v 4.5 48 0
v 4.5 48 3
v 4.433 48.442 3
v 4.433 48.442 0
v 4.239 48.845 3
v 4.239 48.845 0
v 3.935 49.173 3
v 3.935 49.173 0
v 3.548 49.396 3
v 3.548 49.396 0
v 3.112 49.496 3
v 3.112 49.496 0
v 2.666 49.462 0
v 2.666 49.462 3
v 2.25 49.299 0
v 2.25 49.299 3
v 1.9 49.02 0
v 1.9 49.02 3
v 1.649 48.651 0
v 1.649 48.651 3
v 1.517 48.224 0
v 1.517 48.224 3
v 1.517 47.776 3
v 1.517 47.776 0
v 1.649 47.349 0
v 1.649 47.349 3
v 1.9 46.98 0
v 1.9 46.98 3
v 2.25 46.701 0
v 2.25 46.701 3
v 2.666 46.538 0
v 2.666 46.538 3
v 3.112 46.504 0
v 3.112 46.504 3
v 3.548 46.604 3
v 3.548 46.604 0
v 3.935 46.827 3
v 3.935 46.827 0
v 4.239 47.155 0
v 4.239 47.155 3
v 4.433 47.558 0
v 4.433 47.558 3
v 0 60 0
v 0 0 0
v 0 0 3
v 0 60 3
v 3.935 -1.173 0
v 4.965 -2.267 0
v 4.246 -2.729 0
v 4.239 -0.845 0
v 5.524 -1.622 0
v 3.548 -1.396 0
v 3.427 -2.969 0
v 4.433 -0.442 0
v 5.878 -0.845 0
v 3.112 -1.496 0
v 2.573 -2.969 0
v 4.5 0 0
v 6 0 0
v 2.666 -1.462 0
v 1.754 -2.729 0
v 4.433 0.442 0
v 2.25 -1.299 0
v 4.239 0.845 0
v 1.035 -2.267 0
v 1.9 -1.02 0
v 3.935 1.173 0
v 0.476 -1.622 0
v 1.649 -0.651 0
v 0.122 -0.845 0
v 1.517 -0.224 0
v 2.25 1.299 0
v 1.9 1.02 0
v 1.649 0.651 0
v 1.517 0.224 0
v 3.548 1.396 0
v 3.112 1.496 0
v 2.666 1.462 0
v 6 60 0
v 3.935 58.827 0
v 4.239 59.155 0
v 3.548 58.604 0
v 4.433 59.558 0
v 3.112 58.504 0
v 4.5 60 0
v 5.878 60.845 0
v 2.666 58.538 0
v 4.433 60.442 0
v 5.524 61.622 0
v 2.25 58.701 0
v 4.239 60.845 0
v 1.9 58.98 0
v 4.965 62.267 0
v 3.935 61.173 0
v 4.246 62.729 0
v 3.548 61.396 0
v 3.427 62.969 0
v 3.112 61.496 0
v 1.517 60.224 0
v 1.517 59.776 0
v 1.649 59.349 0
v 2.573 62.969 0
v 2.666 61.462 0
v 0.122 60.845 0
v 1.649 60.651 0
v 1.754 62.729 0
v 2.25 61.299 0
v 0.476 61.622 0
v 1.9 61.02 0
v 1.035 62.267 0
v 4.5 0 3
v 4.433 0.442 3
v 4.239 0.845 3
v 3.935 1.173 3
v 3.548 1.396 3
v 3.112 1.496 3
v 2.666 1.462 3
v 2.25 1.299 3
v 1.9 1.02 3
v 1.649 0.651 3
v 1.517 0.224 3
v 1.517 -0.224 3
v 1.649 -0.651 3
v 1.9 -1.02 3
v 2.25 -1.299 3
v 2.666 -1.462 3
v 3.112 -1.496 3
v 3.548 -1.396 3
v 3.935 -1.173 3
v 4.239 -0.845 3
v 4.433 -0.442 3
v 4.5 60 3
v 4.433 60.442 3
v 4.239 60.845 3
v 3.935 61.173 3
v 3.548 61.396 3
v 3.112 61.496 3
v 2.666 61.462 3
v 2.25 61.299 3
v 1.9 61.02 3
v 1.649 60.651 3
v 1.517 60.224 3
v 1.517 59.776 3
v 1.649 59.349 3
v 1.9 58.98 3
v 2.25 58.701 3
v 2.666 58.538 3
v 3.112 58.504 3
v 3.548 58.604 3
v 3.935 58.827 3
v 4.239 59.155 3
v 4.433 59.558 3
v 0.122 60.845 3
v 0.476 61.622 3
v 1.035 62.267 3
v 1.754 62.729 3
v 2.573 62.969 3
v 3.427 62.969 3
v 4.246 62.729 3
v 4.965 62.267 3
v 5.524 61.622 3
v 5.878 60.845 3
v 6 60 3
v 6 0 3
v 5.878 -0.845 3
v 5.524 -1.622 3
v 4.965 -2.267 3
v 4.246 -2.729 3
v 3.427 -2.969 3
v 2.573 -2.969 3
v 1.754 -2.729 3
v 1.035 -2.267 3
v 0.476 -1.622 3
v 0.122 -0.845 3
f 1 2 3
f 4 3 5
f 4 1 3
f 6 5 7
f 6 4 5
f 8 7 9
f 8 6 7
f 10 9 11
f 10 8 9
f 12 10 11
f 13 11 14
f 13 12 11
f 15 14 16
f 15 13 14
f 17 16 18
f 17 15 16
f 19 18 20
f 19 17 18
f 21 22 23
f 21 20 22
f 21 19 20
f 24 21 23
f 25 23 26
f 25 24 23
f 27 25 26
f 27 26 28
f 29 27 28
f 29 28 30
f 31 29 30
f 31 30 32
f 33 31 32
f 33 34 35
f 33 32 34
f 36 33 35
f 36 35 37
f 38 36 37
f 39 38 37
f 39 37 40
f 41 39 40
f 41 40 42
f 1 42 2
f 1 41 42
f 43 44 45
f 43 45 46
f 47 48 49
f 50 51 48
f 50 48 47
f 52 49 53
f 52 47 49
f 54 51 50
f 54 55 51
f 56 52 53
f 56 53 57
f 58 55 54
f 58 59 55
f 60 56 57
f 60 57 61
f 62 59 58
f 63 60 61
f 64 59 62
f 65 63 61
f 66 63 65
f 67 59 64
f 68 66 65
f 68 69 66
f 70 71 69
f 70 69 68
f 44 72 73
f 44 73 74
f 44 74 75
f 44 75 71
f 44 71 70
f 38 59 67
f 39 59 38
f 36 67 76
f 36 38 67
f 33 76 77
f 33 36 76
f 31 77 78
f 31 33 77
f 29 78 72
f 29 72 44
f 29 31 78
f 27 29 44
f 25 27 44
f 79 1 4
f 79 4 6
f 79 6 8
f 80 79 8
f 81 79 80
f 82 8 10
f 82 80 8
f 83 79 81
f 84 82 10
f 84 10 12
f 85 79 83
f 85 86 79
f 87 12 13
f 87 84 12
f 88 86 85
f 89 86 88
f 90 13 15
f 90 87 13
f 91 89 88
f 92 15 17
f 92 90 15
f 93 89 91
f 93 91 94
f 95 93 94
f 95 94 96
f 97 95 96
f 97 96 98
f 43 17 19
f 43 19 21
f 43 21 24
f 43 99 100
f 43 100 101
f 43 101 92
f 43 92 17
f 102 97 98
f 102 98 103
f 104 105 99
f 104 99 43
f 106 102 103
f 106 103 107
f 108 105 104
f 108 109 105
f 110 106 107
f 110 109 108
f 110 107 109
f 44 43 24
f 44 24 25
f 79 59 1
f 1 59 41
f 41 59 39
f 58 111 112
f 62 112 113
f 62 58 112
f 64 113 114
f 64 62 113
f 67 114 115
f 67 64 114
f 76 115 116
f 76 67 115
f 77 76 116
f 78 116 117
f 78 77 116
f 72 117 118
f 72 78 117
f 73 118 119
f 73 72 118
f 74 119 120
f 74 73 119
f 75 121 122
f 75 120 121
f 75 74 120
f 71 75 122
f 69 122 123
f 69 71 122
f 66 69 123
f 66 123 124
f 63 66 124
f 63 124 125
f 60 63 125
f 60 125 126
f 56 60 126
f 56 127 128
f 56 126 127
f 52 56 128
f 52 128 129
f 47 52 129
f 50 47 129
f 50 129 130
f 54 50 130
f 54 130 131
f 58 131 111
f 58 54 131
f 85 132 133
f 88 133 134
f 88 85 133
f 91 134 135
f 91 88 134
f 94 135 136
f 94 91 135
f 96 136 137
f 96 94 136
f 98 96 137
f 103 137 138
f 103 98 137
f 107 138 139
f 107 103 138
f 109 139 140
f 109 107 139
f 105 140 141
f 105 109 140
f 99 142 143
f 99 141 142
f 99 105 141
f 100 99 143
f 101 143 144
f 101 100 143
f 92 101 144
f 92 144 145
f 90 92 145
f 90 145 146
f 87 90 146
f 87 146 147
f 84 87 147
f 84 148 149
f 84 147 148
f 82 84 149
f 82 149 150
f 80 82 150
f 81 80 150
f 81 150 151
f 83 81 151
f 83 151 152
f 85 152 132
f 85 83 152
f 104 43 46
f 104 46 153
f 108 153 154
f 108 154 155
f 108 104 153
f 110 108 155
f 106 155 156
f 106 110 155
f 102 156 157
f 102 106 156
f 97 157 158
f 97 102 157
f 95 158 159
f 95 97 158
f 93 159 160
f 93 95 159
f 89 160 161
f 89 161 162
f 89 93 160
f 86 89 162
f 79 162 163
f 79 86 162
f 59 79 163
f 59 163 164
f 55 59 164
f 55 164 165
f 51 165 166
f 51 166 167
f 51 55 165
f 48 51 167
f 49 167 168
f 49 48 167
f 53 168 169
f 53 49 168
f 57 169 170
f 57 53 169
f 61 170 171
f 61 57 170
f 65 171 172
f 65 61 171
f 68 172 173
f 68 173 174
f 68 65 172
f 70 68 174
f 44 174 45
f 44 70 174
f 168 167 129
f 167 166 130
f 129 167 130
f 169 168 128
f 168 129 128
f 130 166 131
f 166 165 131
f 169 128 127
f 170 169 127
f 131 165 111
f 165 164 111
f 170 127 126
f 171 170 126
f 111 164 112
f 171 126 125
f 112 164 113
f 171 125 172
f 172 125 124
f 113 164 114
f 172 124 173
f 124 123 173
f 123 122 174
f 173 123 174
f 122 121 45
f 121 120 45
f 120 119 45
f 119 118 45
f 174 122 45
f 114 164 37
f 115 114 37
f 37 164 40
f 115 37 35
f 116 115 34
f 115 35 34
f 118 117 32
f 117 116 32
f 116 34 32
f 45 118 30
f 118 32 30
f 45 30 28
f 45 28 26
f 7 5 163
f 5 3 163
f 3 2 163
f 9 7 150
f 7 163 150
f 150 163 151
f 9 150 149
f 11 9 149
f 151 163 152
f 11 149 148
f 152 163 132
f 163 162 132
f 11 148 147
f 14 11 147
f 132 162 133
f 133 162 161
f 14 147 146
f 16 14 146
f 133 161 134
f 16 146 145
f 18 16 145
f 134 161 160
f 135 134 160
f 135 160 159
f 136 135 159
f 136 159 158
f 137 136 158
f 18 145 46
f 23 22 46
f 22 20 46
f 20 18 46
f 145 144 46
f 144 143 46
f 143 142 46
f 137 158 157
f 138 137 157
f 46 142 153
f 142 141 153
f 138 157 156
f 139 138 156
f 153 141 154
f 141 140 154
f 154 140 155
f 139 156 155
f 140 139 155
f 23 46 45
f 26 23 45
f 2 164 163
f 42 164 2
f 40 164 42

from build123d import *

# Parameters (mm, degrees)
EXTRUDE_1_DEPTH     = 3
SKETCH_3_R          = 1.5
CUT_EXTRUDE_3_DEPTH = 5


with BuildPart() as part:
    # 草图1 → 凸台-拉伸1 (new body)
    with BuildSketch(Plane.XY):
        with BuildLine():
            Line((0, 0), (0, 60))
            ThreePointArc((0, 60), (3, 63), (6, 60))
            Line((6, 60), (6, 0))
            ThreePointArc((6, 0), (3, -3), (0, 0))
        make_face()
    extrude(amount=EXTRUDE_1_DEPTH)

    # 草图3 → 切除-拉伸3 (cut)
    with BuildSketch(Plane.XY):
        with Locations((3, 0)):
            Circle(SKETCH_3_R)
        with Locations((3, 60)):
            Circle(SKETCH_3_R)
        with Locations((3, 48)):
            Circle(SKETCH_3_R)
    extrude(amount=CUT_EXTRUDE_3_DEPTH, mode=Mode.SUBTRACT)


solid = part.part
